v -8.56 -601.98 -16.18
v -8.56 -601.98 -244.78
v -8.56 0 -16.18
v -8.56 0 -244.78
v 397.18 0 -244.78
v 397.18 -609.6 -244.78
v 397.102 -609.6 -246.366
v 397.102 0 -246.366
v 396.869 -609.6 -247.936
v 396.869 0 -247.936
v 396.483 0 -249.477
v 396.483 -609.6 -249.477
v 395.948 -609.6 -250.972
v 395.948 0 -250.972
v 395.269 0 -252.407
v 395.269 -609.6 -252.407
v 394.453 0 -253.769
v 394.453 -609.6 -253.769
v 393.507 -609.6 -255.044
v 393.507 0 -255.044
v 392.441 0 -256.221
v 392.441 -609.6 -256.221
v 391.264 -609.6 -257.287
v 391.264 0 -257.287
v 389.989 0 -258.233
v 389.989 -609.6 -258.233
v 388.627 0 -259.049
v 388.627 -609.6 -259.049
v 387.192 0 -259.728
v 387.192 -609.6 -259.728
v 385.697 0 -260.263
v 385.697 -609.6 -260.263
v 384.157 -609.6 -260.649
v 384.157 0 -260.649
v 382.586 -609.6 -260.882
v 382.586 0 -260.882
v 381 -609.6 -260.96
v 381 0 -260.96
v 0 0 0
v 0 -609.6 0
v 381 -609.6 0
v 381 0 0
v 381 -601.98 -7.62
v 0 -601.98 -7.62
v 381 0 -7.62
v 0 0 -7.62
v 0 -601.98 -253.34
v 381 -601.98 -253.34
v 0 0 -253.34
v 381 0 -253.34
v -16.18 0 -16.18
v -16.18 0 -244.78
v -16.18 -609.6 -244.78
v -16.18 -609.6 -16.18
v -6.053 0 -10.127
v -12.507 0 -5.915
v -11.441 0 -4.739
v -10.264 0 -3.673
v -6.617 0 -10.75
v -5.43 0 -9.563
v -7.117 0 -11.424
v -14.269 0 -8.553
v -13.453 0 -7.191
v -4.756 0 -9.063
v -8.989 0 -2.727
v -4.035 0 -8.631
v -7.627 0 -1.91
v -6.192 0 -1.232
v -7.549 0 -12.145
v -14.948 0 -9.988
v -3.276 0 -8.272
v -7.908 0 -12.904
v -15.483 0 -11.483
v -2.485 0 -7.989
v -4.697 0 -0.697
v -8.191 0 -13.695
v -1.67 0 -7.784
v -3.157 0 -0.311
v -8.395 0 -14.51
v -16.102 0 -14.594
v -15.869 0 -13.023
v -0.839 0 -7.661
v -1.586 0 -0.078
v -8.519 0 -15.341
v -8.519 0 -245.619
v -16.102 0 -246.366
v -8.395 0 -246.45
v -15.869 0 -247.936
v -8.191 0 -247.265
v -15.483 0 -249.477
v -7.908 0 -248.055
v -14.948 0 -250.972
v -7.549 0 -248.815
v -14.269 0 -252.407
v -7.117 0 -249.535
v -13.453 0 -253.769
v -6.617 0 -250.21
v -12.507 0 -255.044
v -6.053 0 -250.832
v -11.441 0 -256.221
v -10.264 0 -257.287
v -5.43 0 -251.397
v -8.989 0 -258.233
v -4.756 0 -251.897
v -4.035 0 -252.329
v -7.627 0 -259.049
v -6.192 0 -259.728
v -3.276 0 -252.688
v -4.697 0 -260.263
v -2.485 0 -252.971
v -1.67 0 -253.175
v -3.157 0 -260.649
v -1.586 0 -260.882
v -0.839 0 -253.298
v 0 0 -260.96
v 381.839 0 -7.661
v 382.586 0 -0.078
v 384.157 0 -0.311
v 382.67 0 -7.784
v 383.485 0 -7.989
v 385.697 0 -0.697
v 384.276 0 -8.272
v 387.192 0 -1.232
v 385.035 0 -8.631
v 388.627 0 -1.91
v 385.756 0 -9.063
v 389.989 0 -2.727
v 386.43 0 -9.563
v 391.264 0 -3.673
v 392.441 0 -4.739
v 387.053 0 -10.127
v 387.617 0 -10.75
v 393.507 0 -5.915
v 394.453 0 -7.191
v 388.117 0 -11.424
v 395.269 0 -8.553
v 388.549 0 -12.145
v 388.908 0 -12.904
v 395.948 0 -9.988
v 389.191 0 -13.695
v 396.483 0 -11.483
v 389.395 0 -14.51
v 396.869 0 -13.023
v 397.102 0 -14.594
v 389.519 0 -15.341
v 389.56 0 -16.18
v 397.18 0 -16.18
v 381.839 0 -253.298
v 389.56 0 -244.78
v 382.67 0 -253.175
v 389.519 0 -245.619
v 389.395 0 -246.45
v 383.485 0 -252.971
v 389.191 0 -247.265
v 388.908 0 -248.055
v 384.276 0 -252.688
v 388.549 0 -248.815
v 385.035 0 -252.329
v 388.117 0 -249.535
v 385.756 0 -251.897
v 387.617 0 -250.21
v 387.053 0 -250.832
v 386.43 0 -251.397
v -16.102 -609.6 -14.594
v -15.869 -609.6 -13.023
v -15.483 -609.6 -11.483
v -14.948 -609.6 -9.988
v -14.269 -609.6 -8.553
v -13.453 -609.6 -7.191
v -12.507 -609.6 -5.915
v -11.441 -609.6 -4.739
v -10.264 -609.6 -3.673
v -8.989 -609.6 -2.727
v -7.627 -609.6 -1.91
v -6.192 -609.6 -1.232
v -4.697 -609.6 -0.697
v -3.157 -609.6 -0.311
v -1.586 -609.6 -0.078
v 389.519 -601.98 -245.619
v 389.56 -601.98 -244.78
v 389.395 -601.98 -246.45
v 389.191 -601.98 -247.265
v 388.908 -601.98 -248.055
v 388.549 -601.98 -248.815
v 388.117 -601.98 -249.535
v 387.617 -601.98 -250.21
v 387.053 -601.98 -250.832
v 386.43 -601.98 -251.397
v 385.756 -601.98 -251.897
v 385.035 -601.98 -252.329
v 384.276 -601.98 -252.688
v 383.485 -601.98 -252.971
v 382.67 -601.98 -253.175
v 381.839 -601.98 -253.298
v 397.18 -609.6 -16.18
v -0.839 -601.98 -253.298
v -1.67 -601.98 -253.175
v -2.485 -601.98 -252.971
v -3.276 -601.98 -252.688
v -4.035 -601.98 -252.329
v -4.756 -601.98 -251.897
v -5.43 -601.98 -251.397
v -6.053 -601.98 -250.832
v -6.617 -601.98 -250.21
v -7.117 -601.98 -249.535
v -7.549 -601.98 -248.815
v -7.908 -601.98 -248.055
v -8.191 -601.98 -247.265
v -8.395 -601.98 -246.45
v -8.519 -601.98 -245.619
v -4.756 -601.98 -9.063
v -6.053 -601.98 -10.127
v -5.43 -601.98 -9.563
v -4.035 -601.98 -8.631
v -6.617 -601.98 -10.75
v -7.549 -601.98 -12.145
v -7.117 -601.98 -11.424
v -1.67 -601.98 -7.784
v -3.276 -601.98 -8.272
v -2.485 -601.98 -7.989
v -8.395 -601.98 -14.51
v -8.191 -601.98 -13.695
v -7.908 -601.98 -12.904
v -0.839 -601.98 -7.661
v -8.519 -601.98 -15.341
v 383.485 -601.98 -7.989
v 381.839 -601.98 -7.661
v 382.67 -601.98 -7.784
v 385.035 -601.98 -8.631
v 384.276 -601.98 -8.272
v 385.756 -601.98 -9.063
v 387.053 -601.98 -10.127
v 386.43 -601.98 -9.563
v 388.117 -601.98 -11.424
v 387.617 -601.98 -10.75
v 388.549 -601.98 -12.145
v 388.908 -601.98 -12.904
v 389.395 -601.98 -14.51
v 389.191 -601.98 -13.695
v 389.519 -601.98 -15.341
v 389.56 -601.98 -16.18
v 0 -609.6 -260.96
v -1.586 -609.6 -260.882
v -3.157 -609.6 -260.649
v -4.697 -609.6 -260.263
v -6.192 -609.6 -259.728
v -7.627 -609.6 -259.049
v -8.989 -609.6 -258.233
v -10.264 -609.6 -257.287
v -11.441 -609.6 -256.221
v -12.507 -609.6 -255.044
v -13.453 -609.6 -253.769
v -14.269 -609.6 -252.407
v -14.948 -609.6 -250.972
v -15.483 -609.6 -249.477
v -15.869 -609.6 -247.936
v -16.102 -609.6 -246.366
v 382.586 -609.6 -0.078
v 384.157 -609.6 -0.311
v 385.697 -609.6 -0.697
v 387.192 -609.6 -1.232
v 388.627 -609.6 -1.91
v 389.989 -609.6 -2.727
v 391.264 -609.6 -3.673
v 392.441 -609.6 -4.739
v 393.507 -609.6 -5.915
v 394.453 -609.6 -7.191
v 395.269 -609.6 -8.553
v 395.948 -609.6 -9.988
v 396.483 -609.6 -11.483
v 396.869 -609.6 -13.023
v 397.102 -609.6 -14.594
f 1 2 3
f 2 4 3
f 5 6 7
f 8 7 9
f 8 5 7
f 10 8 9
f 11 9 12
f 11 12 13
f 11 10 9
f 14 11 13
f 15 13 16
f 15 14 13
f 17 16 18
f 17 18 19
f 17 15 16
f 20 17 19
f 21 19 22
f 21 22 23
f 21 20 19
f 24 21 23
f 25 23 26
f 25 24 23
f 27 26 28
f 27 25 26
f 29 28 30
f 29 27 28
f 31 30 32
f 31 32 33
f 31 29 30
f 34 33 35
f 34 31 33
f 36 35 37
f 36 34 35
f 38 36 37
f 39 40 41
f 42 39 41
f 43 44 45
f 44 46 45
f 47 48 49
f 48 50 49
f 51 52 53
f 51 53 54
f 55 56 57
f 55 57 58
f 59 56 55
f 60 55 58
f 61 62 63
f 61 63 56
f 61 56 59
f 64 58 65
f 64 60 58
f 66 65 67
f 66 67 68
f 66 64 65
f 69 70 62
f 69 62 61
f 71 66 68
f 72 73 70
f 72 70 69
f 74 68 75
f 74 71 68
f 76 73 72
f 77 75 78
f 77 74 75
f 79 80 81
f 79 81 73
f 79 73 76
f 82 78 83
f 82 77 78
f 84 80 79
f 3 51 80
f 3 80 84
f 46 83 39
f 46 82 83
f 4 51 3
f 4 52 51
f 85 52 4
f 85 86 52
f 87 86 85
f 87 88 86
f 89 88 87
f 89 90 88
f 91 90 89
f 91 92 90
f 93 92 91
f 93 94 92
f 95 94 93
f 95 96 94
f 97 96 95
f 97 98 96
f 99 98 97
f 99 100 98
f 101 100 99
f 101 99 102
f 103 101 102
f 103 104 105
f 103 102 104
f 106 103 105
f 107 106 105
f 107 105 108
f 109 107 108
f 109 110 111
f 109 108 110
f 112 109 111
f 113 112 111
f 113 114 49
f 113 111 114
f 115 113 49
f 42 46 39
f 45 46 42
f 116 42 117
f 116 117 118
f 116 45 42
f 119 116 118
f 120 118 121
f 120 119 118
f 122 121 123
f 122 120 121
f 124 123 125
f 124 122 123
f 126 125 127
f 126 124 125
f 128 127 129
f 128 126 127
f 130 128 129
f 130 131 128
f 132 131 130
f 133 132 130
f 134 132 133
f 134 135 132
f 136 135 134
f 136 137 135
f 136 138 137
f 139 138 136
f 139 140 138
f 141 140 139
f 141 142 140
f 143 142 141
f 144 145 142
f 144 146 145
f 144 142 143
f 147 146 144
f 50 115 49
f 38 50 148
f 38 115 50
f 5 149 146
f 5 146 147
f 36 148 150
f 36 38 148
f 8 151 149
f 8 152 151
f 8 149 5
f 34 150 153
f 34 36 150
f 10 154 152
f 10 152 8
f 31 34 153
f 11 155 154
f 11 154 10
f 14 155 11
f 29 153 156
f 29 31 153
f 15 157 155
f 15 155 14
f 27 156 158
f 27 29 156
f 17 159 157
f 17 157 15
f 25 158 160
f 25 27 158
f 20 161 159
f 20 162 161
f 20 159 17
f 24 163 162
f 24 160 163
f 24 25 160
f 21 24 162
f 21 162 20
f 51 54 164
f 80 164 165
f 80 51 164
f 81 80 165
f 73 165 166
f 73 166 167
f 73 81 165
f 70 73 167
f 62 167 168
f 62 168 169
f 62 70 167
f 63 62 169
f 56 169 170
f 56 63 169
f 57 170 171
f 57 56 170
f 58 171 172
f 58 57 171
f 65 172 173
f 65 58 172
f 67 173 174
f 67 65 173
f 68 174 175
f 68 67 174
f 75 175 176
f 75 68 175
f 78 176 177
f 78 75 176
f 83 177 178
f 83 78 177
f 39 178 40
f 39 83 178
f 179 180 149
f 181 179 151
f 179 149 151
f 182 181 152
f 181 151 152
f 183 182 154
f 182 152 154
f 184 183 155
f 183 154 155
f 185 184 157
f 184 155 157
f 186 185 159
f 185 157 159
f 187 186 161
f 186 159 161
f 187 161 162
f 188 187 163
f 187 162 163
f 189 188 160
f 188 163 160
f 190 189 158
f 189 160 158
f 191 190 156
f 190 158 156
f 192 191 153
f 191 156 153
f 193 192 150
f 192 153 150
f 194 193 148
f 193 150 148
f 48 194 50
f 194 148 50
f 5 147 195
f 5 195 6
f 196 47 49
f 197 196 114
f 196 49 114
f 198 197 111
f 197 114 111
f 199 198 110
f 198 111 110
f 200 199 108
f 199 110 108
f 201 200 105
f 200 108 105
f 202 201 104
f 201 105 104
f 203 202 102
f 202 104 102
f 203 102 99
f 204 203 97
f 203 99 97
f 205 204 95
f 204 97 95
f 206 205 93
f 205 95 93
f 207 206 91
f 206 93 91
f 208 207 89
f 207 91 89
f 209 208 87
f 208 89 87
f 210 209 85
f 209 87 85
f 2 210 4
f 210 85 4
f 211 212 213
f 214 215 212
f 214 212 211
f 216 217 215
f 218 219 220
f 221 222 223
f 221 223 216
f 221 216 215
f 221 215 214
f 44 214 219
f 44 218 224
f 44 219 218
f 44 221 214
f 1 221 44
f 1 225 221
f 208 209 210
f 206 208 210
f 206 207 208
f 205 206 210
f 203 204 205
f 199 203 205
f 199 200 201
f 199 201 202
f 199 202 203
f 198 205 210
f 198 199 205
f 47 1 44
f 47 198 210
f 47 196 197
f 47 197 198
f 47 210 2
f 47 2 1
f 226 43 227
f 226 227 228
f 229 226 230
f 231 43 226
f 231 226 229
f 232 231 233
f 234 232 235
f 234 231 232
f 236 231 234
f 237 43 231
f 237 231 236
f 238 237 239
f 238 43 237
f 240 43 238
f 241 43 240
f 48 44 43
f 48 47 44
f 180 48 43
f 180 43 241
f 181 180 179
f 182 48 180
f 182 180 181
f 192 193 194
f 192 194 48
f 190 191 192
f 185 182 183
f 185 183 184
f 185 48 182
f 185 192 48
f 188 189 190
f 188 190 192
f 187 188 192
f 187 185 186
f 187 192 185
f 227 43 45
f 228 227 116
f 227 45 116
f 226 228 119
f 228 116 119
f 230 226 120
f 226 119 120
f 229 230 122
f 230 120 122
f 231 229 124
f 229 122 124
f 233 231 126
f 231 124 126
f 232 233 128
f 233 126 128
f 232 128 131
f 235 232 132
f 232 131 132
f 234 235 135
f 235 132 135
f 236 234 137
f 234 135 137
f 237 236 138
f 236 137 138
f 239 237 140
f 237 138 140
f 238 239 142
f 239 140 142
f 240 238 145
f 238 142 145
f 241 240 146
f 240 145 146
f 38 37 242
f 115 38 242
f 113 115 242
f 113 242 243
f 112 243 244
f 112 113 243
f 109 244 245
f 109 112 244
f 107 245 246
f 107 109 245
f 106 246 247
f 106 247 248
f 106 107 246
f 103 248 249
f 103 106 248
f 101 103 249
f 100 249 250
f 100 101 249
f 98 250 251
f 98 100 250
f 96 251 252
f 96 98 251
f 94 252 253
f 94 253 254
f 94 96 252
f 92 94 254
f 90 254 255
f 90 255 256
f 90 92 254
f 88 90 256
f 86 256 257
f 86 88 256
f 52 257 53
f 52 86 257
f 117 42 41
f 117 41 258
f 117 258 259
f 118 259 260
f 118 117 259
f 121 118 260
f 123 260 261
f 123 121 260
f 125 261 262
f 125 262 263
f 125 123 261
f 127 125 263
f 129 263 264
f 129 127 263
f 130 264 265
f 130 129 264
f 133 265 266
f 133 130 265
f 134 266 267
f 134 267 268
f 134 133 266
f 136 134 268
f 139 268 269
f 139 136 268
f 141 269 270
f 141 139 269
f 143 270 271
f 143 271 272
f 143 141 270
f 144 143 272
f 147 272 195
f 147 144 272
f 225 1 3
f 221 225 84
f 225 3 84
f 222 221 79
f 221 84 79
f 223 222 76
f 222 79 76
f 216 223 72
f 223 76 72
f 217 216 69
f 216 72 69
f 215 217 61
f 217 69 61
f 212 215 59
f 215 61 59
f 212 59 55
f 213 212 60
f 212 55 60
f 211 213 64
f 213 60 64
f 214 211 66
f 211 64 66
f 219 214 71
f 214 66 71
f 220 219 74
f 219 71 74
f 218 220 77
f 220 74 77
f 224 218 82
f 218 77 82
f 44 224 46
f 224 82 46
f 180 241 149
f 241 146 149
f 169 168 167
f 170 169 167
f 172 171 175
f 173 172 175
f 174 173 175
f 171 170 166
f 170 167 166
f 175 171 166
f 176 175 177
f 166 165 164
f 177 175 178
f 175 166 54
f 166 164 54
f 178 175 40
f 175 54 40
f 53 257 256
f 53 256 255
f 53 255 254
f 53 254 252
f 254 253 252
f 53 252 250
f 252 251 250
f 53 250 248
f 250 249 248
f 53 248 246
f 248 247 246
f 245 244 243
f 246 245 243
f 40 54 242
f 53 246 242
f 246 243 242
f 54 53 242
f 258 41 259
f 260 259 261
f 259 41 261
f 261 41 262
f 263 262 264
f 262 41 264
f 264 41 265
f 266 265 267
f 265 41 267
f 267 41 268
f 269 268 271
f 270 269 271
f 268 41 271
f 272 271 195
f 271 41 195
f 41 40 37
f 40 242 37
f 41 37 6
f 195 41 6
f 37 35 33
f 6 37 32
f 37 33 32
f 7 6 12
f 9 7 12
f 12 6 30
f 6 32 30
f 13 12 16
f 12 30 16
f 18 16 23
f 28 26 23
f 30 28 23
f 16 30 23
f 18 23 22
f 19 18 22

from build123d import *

# Parameters (mm, degrees)
BOSS_EXTRUDE1_DEPTH = 609.6
SHELL1_T            = -7.62


with BuildPart() as part:
    # Sketch1 → Boss-Extrude1 (new body)
    with BuildSketch(Plane(origin=(0, 0, 0), x_dir=(1, 0, 0), z_dir=(0, 1, 0))):
        with BuildLine():
            Line((0, 0), (381, 0))
            ThreePointArc((381, 0), (392.440846298, 4.738953702), (397.1798, 16.1798))
            Line((397.1798, 16.1798), (397.1798, 244.7798))
            ThreePointArc((397.1798, 244.7798), (392.440846298, 256.220646298), (381, 260.9596))
            Line((381, 260.9596), (0, 260.9596))
            ThreePointArc((0, 260.9596), (-11.440846298, 256.220646298), (-16.1798, 244.7798))
            Line((-16.1798, 244.7798), (-16.1798, 16.1798))
            ThreePointArc((-16.1798, 16.1798), (-11.440846298, 4.738953702), (0, 0))
        make_face()
    extrude(amount=-BOSS_EXTRUDE1_DEPTH)

    # Shell1
    shell1_openings = [part.faces().sort_by_distance(p)[0] for p in [
        (190.5, 0, -130.4798),
    ]]
    offset(amount=SHELL1_T, openings=shell1_openings, kind=Kind.INTERSECTION)


solid = part.part
